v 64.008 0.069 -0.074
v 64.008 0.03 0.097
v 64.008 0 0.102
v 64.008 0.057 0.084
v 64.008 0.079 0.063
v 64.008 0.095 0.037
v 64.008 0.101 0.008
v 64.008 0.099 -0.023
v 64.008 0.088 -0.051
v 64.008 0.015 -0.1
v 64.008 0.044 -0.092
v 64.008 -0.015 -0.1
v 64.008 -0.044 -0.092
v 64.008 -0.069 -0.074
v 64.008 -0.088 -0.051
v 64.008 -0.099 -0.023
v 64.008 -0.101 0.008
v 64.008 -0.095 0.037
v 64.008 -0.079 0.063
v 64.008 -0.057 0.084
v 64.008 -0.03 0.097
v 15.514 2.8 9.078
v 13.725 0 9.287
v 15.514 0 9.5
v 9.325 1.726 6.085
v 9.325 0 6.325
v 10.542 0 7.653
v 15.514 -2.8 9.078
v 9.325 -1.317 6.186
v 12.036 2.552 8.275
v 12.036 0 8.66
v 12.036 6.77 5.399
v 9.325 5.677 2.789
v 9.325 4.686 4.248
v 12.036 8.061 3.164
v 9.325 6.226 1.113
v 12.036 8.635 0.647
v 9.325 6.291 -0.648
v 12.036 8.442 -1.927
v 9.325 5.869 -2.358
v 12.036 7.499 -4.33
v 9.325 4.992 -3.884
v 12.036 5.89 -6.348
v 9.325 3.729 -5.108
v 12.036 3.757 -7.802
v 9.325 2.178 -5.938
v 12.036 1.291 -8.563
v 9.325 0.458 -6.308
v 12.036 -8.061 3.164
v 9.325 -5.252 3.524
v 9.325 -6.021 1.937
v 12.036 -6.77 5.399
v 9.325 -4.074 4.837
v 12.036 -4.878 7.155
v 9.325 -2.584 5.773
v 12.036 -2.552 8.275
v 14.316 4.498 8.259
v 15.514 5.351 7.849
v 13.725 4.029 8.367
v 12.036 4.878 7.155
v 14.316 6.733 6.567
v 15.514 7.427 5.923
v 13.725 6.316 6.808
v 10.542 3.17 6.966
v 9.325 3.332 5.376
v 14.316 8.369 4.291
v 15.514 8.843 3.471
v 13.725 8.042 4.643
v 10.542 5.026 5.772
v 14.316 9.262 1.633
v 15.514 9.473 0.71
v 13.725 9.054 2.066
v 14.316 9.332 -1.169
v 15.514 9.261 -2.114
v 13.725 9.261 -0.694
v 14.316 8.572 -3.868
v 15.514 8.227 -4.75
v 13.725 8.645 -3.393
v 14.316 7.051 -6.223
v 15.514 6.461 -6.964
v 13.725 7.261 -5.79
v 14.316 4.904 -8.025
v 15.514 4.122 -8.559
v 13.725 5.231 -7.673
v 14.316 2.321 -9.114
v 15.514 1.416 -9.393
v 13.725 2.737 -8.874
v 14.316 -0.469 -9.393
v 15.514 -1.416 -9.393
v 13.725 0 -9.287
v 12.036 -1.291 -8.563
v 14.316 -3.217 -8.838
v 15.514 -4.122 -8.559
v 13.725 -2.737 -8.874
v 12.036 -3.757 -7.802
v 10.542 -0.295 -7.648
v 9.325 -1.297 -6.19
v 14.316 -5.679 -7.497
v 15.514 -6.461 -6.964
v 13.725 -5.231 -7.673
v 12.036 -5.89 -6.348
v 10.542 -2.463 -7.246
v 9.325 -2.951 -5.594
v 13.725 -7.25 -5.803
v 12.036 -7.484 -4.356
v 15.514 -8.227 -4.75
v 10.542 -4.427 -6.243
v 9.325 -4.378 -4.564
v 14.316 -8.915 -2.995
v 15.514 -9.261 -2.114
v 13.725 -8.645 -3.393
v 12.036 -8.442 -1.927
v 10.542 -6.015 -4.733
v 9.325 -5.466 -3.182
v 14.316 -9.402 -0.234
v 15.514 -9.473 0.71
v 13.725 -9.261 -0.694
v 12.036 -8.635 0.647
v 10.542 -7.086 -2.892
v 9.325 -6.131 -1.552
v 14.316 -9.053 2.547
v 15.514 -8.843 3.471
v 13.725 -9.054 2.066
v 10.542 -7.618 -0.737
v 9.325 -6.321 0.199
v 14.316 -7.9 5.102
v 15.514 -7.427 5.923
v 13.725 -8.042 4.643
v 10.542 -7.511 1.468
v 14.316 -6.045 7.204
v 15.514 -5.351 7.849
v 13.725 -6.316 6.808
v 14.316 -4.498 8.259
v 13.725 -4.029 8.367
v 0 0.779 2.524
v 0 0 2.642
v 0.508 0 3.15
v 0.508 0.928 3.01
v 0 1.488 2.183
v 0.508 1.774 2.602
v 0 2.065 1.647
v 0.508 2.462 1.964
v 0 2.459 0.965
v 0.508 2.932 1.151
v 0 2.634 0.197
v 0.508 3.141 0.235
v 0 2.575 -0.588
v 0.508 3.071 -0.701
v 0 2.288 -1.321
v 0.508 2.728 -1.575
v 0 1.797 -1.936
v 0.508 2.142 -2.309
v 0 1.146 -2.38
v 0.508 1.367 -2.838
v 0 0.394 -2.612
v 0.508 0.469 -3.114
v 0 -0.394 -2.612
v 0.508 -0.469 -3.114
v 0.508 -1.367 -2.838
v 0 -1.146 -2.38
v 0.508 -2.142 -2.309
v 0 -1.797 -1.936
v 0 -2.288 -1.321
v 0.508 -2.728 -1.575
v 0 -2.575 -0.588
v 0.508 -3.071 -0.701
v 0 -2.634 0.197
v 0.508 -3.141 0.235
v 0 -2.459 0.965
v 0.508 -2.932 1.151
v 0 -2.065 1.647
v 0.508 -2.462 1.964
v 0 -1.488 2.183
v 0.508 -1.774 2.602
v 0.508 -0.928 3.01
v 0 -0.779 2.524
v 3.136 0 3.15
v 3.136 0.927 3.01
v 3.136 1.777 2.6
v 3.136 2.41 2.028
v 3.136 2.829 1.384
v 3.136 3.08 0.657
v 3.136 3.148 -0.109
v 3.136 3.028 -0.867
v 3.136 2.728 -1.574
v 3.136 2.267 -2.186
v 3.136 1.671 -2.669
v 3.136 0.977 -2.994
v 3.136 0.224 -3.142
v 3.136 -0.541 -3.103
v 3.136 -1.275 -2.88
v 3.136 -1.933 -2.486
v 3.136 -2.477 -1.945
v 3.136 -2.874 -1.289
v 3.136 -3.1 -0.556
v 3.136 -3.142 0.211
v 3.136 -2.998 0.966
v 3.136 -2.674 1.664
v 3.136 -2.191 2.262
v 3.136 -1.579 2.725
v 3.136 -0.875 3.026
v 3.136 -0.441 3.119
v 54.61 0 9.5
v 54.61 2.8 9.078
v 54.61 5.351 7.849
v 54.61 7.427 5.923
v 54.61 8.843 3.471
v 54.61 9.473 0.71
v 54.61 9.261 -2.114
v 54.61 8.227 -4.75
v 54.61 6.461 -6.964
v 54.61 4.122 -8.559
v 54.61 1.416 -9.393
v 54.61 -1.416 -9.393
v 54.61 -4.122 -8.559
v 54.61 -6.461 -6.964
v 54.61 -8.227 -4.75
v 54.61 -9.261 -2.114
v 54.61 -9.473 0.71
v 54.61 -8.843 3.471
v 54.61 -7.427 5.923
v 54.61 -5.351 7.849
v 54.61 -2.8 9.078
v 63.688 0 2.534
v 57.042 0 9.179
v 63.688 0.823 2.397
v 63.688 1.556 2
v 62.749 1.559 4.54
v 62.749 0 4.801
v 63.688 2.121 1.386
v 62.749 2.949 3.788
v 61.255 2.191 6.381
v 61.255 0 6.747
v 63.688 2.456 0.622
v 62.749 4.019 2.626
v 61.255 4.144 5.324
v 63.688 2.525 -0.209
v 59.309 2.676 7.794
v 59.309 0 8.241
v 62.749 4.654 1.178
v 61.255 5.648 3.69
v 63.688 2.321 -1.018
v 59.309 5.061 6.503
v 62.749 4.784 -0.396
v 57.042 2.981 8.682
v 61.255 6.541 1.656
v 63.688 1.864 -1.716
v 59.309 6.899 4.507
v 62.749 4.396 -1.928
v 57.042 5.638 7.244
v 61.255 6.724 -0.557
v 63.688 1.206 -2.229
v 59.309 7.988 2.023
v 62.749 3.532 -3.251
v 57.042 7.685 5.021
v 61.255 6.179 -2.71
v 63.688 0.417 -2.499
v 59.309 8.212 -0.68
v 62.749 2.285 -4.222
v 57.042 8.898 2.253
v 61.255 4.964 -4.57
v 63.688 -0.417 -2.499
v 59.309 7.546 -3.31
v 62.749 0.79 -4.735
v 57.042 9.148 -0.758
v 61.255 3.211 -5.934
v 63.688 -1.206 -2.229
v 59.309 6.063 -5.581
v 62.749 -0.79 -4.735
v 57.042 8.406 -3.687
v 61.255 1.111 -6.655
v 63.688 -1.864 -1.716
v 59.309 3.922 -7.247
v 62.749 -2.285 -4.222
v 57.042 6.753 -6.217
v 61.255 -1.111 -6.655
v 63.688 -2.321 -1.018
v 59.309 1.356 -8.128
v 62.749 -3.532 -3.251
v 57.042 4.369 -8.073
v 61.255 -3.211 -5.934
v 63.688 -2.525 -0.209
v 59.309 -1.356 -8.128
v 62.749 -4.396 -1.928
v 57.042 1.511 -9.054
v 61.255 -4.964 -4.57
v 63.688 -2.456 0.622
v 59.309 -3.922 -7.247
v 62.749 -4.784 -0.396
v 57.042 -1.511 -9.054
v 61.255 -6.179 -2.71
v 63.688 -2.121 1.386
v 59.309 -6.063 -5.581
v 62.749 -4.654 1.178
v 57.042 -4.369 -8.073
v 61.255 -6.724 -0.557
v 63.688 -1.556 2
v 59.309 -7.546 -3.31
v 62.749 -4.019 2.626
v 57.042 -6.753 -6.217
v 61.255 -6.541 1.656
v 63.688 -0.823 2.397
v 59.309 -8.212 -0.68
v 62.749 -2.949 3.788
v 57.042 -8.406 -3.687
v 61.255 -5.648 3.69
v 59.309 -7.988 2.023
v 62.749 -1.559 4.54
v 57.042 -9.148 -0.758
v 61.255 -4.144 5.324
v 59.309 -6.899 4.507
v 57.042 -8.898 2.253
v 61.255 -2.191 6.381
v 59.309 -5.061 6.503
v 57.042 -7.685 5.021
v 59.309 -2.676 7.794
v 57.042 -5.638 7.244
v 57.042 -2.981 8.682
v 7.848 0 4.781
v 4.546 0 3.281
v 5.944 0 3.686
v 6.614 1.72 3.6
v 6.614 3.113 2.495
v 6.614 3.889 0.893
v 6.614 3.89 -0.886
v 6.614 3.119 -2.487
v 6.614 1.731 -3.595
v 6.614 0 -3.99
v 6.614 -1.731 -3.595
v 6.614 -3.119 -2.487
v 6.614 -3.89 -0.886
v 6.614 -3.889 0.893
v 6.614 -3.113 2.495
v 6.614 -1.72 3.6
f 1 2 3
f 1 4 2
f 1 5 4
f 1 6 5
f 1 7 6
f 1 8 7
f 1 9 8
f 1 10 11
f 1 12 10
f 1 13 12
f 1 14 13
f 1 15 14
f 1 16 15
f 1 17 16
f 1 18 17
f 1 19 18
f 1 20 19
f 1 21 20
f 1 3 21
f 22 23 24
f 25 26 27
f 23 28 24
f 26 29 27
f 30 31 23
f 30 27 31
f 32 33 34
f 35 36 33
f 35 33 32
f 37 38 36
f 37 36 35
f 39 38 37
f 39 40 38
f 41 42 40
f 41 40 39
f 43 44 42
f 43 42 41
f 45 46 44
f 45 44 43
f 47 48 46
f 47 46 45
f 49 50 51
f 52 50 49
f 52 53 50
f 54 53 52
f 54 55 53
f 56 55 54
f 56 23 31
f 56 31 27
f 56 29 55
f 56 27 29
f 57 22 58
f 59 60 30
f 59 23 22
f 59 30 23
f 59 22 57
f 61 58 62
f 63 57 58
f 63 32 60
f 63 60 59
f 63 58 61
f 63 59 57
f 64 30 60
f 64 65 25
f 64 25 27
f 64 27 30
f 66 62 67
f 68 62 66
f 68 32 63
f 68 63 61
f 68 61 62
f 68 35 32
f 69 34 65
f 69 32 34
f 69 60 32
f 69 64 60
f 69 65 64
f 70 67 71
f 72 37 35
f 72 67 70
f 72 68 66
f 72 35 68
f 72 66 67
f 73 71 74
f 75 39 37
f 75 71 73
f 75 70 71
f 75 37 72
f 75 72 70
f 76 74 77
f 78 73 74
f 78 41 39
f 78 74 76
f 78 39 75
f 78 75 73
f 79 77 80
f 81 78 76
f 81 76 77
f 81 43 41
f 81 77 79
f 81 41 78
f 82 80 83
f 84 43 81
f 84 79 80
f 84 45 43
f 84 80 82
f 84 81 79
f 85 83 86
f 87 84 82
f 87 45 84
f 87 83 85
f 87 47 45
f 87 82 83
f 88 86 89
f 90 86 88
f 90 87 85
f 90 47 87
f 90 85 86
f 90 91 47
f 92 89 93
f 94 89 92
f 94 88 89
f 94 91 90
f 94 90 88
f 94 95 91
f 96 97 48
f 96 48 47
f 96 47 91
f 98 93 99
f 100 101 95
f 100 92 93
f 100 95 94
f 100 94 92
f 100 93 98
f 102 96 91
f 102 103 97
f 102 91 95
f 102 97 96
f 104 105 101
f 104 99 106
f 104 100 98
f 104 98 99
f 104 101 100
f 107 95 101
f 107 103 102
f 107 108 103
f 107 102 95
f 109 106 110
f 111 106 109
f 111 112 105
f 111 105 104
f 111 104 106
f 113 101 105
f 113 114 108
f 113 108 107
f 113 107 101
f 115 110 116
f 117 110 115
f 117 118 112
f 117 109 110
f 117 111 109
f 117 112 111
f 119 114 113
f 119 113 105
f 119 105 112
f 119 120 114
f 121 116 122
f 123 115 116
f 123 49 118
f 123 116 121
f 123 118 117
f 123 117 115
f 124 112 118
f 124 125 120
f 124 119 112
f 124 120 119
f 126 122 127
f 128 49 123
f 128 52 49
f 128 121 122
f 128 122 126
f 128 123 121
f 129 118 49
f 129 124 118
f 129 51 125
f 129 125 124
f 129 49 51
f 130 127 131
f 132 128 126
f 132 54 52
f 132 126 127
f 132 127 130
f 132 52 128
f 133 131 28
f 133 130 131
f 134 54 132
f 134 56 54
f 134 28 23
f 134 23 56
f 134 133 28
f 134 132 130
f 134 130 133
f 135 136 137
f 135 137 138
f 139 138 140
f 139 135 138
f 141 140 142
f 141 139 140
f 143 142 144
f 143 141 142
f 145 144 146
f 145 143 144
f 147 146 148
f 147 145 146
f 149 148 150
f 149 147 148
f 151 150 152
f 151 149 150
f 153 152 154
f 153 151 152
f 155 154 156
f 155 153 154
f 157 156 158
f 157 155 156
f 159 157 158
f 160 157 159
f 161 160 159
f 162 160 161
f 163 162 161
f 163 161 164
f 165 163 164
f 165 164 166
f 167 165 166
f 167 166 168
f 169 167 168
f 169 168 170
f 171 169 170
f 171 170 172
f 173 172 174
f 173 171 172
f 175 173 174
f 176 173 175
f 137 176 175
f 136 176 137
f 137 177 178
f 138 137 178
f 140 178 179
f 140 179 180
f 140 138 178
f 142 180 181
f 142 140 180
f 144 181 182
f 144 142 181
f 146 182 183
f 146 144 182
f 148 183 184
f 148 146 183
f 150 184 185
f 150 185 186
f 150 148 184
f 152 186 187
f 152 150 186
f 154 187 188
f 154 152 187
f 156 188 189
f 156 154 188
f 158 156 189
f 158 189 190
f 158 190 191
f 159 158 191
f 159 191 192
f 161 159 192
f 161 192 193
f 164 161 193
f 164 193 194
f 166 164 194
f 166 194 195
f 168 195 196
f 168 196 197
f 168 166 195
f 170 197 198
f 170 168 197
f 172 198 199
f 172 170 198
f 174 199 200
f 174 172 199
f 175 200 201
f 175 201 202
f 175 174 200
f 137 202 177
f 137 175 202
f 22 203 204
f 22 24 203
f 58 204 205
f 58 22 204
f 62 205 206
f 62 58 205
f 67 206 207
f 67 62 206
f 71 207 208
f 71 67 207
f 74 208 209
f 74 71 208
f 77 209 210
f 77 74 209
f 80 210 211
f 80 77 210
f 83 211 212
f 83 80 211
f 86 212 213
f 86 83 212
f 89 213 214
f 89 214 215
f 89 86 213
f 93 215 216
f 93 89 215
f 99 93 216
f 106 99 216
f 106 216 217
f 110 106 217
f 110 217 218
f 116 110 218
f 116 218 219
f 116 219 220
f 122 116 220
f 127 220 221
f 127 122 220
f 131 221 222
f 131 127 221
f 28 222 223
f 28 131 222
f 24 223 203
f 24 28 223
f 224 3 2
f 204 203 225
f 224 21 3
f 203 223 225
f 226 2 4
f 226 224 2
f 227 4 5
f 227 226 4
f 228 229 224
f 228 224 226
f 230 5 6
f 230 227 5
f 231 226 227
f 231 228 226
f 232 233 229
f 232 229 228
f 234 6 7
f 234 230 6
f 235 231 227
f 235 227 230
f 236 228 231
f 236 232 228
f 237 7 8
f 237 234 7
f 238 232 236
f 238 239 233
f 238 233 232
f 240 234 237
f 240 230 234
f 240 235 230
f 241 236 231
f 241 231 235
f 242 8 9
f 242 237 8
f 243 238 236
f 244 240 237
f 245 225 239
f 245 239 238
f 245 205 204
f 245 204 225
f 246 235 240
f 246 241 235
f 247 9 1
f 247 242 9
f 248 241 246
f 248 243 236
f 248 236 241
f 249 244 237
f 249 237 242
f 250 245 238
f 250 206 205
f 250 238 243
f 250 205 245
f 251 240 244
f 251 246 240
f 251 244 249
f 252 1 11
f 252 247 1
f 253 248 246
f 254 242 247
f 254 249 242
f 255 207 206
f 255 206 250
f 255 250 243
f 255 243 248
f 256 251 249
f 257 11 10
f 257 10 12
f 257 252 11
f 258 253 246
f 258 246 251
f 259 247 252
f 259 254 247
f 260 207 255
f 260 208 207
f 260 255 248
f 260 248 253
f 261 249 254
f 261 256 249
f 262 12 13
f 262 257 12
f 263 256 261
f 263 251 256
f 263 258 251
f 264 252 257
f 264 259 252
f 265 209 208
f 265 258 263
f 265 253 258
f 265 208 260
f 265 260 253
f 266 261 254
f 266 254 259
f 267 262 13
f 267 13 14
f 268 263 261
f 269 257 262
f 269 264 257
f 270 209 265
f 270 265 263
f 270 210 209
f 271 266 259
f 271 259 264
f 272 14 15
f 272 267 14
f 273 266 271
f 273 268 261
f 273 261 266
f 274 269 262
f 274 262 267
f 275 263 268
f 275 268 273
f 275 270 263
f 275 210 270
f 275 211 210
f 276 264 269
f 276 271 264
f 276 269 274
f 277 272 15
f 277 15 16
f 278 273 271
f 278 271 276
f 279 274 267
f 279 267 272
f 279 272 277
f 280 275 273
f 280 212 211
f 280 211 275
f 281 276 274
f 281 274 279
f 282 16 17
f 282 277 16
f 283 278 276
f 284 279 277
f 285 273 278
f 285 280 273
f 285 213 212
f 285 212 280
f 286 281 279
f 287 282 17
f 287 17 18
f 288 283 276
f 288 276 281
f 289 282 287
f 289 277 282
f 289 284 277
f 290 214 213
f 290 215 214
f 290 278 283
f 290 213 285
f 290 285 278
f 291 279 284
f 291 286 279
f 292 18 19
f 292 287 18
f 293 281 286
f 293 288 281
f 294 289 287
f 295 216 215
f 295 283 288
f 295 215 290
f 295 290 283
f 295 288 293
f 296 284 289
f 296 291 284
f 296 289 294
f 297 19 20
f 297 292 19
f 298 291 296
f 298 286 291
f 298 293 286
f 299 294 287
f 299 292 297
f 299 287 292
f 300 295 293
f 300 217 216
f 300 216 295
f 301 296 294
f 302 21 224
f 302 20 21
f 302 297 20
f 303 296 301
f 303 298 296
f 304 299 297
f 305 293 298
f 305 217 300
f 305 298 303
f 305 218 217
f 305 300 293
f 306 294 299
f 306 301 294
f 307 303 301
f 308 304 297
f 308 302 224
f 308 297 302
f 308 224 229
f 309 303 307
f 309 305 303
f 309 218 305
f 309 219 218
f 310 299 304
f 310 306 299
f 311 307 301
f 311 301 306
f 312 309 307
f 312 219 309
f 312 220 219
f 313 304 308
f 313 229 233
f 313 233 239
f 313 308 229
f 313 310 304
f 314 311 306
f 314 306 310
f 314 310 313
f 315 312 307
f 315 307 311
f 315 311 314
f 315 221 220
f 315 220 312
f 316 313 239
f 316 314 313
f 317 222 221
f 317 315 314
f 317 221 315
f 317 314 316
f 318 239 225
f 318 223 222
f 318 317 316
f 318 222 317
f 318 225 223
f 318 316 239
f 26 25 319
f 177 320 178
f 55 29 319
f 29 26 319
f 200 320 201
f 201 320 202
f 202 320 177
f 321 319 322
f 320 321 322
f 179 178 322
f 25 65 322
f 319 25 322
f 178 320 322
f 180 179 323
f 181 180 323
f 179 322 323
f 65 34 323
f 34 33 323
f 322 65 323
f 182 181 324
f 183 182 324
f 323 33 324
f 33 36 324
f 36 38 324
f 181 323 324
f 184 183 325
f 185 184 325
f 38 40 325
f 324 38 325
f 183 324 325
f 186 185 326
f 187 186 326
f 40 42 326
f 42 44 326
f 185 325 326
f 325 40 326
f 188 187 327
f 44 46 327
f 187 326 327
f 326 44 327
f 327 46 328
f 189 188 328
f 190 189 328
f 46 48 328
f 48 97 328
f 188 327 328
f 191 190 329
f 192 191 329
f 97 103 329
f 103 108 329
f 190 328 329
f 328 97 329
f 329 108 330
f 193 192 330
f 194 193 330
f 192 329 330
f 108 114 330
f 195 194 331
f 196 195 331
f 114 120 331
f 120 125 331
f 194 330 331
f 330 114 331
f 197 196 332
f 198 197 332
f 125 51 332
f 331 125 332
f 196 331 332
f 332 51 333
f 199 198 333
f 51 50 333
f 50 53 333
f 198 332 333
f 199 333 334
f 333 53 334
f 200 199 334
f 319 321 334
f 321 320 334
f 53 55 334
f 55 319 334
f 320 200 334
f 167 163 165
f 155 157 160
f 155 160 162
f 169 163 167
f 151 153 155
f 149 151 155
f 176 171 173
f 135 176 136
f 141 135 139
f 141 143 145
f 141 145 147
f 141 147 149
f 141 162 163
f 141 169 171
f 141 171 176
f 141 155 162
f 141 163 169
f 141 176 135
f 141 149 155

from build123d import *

# Parameters (mm, degrees)
F2_R    = 9.398
F4_R    = 7.62
F5_SIZE = 0.508


# Not quite as in the source:
# - a fillet or chamfer that OpenCascade refuses, or shapes differently, is made with other operations: its cross-section is extruded or revolved along the edge and cut away or added


with BuildPart() as f1:
    # F0 (on Front) → F1 (revolve)
    with BuildSketch(Plane.XZ):
        Polygon((0, 3.1496), (0, 0), (64.008, 0), (64.008, 9.4996), (8.001, 9.4996), (8.001, 3.1496), align=None)
    revolve(axis=Axis((-4.5283841901, 0, 0), (-1, 0, 0)))

    # F2
    f2_edges = [f1.edges().sort_by_distance(p)[0] for p in [
        (64.008, 0, -9.4996),
    ]]
    fillet(f2_edges, radius=F2_R)

    # F3: fillet of radius 7.62 on 1 edges, made by hand

    # F3_s1 → F3_t2 (revolve, cut)
    with BuildSketch(Plane.XZ):
        with BuildLine():
            ThreePointArc((15.5144213245, 9.4996), (10.5957324749, 7.6994711326), (8.001, 3.1496))
            Line((8.001, 3.1496), (8.001, 9.4996))
            Line((8.001, 9.4996), (15.5144213245, 9.4996))
        make_face()
    revolve(axis=Axis((8.001, 0, 0), (-1, 0, 0)), mode=Mode.SUBTRACT)

    # F4
    f4_edges = [f1.edges().sort_by_distance(p)[0] for p in [
        (8.001, 0, -3.1496),
    ]]
    fillet(f4_edges, radius=F4_R)

    # F5
    f5_edges = [f1.edges().sort_by_distance(p)[0] for p in [
        (0, 0, -3.1496),
    ]]
    chamfer(f5_edges, length=F5_SIZE)


solid = f1.part
